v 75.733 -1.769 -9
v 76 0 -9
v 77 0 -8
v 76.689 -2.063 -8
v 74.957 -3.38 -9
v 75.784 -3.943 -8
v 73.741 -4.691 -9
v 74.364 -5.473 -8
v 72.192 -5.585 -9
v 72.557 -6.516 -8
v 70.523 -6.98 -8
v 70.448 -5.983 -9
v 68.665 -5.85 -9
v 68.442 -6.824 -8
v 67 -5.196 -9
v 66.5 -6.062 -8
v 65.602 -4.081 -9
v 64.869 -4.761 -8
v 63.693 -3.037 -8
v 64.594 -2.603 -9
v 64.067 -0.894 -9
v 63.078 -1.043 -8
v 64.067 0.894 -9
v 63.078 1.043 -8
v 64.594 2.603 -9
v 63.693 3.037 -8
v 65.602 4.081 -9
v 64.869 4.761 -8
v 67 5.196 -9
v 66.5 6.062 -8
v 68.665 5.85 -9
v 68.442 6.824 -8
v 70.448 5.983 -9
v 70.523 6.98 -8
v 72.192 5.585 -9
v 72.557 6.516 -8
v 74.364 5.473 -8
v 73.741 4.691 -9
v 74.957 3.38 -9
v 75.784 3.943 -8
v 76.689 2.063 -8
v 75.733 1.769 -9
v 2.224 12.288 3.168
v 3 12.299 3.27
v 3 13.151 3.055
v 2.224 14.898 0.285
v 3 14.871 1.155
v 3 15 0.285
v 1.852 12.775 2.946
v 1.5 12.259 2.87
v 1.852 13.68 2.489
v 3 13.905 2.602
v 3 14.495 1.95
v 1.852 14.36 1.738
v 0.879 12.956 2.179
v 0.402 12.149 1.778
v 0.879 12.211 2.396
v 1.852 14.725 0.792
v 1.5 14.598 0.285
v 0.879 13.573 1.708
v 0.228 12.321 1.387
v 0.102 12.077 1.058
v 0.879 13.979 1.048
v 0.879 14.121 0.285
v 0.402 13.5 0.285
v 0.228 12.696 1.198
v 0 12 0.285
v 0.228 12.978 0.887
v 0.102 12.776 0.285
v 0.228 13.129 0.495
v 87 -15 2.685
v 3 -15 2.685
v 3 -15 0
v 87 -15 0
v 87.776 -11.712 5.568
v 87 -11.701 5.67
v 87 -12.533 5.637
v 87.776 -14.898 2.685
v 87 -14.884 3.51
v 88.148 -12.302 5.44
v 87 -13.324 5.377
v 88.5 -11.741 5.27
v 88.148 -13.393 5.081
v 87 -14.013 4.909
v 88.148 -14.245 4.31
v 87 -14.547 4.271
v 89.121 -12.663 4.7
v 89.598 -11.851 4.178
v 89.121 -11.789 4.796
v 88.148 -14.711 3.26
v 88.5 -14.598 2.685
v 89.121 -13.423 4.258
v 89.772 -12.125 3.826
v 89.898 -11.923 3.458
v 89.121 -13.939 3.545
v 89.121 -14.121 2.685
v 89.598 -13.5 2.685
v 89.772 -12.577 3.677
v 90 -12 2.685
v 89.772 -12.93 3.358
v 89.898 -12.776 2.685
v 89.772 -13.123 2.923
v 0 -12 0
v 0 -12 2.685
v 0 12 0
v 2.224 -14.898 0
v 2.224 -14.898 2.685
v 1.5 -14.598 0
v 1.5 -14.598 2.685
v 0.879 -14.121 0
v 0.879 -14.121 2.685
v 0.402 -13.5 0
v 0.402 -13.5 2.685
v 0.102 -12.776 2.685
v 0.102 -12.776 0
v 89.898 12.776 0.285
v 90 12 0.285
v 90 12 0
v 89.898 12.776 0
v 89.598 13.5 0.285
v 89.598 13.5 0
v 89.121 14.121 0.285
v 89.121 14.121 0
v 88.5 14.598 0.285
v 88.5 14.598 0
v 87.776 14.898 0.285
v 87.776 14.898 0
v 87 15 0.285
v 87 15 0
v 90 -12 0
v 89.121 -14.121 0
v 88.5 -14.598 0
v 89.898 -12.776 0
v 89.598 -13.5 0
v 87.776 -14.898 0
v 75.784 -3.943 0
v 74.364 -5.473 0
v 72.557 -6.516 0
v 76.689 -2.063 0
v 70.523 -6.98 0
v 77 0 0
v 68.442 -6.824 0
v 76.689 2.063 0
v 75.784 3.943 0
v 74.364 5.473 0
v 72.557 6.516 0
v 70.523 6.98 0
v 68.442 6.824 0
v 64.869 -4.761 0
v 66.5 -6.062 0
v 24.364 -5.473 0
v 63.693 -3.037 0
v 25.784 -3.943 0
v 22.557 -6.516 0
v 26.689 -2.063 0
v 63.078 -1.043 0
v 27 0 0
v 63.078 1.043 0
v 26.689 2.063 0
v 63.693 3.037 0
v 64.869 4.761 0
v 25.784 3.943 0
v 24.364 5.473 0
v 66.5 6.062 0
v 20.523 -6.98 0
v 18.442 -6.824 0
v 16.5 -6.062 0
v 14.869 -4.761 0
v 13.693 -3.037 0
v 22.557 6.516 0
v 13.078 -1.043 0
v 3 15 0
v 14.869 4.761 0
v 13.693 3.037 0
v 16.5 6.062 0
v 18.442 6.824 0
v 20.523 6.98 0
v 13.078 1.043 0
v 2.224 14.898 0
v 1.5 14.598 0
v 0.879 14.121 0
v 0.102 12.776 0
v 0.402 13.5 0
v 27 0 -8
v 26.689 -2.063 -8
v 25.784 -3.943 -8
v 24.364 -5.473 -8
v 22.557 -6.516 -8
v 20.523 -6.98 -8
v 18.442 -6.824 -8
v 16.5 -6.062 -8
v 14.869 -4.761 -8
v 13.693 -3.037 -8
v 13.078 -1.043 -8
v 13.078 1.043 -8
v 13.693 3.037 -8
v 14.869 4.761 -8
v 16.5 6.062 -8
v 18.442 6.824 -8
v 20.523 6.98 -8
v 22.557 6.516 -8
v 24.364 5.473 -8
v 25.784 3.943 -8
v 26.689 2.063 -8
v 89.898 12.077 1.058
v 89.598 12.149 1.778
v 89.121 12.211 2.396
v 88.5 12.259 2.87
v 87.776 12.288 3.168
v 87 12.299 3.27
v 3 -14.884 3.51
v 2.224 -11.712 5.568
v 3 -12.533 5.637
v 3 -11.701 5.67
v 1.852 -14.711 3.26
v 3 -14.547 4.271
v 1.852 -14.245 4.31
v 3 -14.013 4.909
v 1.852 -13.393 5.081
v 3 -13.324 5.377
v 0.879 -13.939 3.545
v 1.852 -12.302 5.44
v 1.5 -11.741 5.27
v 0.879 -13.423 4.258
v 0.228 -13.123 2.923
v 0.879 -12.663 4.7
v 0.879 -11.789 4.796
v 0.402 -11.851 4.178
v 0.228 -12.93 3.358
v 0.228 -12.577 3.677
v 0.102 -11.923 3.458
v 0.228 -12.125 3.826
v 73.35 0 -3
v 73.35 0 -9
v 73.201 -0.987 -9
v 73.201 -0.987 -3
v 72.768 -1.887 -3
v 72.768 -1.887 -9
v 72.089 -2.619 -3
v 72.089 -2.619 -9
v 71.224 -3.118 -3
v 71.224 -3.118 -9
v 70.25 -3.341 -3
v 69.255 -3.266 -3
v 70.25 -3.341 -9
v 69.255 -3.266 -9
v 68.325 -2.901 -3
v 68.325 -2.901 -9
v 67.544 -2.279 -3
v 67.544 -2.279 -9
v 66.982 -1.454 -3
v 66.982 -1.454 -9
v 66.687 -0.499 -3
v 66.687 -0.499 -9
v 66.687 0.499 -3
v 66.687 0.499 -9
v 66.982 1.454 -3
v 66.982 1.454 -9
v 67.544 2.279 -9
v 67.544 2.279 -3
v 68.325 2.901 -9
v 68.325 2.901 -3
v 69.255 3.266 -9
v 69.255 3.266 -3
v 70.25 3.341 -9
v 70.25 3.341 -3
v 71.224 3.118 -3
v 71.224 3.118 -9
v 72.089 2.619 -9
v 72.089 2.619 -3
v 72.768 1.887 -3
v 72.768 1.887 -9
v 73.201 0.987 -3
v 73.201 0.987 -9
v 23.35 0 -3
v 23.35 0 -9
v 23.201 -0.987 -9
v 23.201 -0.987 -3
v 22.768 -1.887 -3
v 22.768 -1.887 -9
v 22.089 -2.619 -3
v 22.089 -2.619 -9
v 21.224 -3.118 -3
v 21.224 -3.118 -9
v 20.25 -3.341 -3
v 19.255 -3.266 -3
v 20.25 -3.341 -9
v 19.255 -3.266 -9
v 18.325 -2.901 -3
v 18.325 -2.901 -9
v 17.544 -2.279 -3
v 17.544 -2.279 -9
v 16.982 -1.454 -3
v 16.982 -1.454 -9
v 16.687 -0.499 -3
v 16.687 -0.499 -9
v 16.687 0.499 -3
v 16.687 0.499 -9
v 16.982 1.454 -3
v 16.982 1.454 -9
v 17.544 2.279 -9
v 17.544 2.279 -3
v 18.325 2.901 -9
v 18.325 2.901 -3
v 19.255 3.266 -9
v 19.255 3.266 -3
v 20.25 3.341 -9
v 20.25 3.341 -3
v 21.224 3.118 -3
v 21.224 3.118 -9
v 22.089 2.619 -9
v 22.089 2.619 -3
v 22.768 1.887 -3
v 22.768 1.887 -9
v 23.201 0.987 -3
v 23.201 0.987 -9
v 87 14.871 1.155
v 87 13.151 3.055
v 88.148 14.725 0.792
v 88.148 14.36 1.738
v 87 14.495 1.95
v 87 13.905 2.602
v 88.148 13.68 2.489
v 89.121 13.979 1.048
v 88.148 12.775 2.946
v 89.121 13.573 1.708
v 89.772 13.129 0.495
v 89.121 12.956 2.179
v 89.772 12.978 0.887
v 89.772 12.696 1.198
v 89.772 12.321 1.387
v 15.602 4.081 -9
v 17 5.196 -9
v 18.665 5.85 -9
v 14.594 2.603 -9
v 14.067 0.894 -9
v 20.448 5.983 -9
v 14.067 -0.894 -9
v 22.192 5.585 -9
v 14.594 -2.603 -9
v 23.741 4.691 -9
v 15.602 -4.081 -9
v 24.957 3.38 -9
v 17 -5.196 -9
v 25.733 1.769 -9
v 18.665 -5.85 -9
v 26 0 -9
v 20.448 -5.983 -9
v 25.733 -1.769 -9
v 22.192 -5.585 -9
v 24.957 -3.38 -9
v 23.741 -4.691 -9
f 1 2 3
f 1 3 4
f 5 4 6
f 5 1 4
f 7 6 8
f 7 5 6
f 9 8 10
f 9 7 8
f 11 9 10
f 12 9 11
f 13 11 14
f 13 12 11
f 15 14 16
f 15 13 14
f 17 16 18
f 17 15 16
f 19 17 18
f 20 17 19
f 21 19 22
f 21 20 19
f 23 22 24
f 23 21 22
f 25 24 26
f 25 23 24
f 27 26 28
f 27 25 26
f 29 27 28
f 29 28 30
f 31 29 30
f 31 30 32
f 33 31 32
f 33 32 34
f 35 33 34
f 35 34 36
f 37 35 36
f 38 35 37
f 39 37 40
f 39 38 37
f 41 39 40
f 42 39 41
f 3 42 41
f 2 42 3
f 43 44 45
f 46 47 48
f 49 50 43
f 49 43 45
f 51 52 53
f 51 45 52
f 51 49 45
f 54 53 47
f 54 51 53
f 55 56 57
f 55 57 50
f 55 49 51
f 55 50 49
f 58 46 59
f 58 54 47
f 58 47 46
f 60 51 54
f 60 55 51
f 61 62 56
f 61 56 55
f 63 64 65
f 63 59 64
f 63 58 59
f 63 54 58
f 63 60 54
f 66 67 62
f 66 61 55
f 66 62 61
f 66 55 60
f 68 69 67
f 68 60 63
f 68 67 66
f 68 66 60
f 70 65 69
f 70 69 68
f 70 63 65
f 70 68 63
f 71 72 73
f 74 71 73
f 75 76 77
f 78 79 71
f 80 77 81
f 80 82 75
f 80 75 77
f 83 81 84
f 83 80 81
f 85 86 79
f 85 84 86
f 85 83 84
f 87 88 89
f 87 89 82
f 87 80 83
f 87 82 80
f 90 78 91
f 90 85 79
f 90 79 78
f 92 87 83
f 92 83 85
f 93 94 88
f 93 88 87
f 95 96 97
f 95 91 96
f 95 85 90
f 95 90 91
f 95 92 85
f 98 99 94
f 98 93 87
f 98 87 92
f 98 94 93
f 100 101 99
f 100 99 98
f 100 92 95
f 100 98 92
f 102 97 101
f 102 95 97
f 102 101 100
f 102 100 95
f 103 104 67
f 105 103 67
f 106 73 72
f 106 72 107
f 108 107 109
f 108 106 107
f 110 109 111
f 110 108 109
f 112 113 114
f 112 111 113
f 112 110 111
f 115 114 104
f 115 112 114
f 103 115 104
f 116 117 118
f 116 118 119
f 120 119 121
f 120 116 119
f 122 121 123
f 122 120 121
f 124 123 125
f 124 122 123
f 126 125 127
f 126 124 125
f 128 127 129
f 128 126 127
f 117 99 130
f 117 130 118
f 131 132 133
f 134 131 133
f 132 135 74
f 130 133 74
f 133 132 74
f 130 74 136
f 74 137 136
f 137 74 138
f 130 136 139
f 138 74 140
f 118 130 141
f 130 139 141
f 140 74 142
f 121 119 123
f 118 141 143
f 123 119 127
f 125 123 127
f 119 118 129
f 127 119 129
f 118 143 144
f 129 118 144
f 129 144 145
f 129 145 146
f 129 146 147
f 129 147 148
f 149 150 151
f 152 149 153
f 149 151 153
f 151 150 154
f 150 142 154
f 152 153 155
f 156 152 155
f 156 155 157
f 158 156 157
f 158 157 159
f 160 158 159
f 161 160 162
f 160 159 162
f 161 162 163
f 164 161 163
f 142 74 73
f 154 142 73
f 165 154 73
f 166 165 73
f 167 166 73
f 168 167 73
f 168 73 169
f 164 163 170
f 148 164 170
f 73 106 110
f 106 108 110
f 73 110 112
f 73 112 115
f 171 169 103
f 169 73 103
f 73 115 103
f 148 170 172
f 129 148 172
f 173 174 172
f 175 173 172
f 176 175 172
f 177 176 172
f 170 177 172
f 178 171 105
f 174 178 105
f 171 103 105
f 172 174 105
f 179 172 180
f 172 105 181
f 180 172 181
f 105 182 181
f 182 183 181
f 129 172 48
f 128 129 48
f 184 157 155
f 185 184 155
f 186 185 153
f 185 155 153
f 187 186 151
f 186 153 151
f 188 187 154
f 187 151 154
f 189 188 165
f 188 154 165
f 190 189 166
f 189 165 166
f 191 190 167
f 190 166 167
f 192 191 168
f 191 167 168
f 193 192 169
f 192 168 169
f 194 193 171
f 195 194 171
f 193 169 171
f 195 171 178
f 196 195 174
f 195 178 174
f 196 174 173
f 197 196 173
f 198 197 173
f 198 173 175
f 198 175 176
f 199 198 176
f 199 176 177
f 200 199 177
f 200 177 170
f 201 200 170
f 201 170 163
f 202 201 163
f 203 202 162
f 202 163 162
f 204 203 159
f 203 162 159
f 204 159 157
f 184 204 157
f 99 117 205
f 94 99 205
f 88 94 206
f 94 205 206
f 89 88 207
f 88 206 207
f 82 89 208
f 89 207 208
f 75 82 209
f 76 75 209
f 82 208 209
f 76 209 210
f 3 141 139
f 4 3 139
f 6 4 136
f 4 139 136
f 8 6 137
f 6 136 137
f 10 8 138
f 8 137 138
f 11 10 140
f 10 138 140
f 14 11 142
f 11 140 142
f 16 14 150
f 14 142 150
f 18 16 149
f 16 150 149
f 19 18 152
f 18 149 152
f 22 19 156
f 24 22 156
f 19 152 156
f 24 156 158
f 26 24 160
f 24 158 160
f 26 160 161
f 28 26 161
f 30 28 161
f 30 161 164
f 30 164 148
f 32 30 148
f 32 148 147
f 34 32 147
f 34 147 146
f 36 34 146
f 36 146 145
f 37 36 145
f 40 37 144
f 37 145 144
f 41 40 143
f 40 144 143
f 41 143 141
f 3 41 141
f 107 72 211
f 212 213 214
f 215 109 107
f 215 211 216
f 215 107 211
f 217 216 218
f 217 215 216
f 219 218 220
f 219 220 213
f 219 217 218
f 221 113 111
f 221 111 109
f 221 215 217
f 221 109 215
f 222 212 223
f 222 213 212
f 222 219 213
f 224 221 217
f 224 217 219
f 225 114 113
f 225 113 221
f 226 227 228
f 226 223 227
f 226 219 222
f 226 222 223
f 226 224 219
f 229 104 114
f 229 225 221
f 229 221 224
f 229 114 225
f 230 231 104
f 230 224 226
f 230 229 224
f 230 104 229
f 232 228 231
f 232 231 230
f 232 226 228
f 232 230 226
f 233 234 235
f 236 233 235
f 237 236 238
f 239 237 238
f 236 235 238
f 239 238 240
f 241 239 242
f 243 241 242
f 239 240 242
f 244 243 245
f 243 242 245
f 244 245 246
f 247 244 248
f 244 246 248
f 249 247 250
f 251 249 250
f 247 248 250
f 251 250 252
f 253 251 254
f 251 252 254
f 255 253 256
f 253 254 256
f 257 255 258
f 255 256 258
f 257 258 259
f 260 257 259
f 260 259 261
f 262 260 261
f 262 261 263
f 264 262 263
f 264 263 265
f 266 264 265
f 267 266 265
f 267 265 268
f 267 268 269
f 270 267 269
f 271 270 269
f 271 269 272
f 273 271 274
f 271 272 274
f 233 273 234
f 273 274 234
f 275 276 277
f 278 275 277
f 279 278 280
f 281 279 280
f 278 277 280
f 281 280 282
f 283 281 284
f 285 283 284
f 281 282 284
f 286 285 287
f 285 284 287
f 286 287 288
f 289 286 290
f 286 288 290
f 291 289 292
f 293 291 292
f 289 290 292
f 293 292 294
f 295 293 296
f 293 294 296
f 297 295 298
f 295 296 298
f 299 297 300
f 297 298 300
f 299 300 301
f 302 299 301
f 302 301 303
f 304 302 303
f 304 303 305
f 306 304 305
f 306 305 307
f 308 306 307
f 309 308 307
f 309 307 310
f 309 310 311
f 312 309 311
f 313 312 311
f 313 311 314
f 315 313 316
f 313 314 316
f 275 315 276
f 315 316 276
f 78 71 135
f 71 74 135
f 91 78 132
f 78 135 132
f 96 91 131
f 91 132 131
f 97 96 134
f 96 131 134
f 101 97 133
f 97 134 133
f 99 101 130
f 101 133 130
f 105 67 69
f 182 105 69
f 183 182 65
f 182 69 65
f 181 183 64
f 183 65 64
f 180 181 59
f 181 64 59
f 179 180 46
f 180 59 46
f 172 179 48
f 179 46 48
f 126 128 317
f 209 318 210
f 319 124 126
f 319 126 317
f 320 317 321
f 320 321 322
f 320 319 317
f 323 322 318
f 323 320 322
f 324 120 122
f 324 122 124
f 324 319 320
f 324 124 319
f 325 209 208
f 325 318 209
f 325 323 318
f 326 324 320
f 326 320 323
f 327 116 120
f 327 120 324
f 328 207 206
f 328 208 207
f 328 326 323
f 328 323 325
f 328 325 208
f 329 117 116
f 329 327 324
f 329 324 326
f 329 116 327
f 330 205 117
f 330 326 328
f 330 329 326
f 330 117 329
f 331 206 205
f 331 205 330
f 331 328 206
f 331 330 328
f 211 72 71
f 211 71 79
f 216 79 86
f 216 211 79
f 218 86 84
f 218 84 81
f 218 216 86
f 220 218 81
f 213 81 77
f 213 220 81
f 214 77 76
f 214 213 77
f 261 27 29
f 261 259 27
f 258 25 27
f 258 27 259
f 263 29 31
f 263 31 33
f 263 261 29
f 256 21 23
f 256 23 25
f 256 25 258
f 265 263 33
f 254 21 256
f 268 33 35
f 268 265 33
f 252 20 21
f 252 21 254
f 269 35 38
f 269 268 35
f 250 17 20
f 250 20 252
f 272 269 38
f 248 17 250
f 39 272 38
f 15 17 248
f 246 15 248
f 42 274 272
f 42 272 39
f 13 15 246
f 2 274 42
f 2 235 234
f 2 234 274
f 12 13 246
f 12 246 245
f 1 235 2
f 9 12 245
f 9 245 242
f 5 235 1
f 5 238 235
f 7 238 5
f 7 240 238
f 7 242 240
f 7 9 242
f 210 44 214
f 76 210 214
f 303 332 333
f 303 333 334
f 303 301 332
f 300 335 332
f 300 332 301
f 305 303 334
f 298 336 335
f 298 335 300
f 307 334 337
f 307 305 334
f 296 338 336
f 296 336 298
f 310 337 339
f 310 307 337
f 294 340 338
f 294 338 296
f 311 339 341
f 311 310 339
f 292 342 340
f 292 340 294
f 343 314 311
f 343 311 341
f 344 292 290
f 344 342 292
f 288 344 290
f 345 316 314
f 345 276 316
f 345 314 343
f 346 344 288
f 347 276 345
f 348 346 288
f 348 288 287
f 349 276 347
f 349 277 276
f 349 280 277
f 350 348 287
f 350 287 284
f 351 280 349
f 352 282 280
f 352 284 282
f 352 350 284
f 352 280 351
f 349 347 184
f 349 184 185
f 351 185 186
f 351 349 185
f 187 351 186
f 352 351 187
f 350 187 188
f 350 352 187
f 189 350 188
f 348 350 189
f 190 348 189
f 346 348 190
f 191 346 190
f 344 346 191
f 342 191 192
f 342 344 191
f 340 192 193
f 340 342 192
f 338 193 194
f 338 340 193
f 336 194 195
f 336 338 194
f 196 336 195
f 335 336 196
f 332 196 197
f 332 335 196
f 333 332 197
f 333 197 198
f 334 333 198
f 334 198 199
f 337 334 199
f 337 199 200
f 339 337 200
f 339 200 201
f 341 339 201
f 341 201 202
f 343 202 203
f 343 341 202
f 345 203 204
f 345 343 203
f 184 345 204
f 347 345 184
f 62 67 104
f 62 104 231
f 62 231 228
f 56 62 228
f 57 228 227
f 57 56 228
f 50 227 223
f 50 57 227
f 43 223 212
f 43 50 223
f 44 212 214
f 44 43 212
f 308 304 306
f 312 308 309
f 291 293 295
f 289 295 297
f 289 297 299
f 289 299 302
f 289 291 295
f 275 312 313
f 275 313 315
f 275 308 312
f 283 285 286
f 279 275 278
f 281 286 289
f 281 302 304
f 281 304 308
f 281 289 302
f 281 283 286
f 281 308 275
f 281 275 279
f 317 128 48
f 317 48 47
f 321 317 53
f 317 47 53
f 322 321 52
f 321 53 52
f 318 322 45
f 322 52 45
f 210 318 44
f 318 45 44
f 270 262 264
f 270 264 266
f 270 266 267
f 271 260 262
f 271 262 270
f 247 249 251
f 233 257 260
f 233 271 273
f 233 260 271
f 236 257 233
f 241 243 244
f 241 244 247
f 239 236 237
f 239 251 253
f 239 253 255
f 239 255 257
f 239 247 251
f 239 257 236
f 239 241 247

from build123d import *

# Parameters (mm, degrees)
F1_DEPTH     = 90
F3_R         = 7
F4_DEPTH     = 9
F5_R         = 3.35
F6_DEPTH     = 6
F7_SIZE      = 1
F8_R         = 3
F9_T1_DEPTH  = 84
F9_T3_DEPTH  = 24.1197014907
F9_T8_DEPTH  = 3
F9_T14_DEPTH = 3
F9_T20_DEPTH = 3
F9_T26_DEPTH = 3


# Not quite as in the source:
# - a fillet or chamfer that OpenCascade refuses, or shapes differently, is made with other operations: its cross-section is extruded or revolved along the edge and cut away or added


with BuildPart() as f1:
    # F0 (on Right) → F1 (new body)
    with BuildSketch(Plane.YZ):
        Polygon((-15, 6), (-15, 0), (15, 0), (15, 3), align=None)
    extrude(amount=F1_DEPTH)

    # F3 (on face) → F4 (join)
    with BuildSketch(Plane(origin=(0, 0, 0), x_dir=(1, 0, 0), z_dir=(0, 0, -1))):
        with Locations((70, 0)):
            Circle(F3_R)
        with Locations((20, 0)):
            Circle(F3_R)
    extrude(amount=F4_DEPTH)

    # F5 (on face) → F6 (cut)
    with BuildSketch(Plane(origin=(0, 0, -9), x_dir=(1, 0, 0), z_dir=(0, 0, -1))):
        with Locations((70, 0)):
            Circle(F5_R)
        with Locations((20, 0)):
            Circle(F5_R)
    extrude(amount=-F6_DEPTH, mode=Mode.SUBTRACT)

    # F7
    f7_edges = [f1.edges().sort_by_distance(p)[0] for p in [
        (63, 0, -9),
        (13, 0, -9),
    ]]
    chamfer(f7_edges, length=F7_SIZE)

    # F8
    f8_edges = [f1.edges().sort_by_distance(p)[0] for p in [
        (90, 15, 1.5),
        (0, 15, 1.5),
        (0, -15, 3),
        (90, -15, 3),
    ]]
    fillet(f8_edges, radius=F8_R)

    # F9: fillet of radius 3 on 4 edges, made by hand

    # F9_s2 → F9_t1 (cut)
    with BuildSketch(Plane.YZ.offset(3)):
        with BuildLine():
            ThreePointArc((15, 0.2850373137), (14.2243576007, 2.2980532759), (12.2985111571, 3.2701488843))
            Line((12.2985111571, 3.2701488843), (15, 3))
            Line((15, 3), (15, 0.2850373137))
        make_face()
        with BuildLine():
            ThreePointArc((-15, 2.6850373137), (-14.0130159623, 4.9093949143), (-11.7014888429, 5.6701488843))
            Line((-11.7014888429, 5.6701488843), (-15, 6))
            Line((-15, 6), (-15, 2.6850373137))
        make_face()
    extrude(amount=F9_T1_DEPTH, mode=Mode.SUBTRACT)

    # F9_s4 → F9_t3 (cut)
    with BuildSketch(Plane(origin=(0, 11.8529666026, -1.1852966603), x_dir=(1, 0, 0), z_dir=(0, -0.9950371902, 0.099503719))):
        with BuildLine():
            ThreePointArc((0, 1.4776673559), (0.8786796564, 3.5989876995), (3, 4.4776673559))
            Line((3, 4.4776673559), (0, 4.4776673559))
            Line((0, 4.4776673559), (0, 1.4776673559))
        make_face()
        with BuildLine():
            ThreePointArc((90, 1.4776673559), (89.1213203436, 3.5989876995), (87, 4.4776673559))
            Line((87, 4.4776673559), (90, 4.4776673559))
            Line((90, 4.4776673559), (90, 1.4776673559))
        make_face()
    extrude(amount=F9_T3_DEPTH, mode=Mode.SUBTRACT)


with BuildPart() as f9_tool6:
    # F9_s7 → F9_t8 (new body)
    with BuildSketch(Plane.YZ.offset(87)):
        Polygon((12, 0.2850373137), (15, 0.2850373137), (15, 3), (12.2985111571, 3.2701488843), align=None)
    extrude(amount=F9_T8_DEPTH)

    # F9_s9 → F9_t10 (revolve, cut)
    with BuildSketch(Plane(origin=(87, 12, 0.2850373137), x_dir=(0, -0.7414525336, -0.6710053208), z_dir=(0, -0.6710053208, 0.7414525336))):
        with BuildLine():
            ThreePointArc((0, -3), (3, 0), (0, 3))
            Line((0, 3), (0, -3))
        make_face()
    revolve(axis=Axis((87, 12, 0.2850373137), (1, 0, 0)), mode=Mode.SUBTRACT)


with BuildPart() as f1_1:
    add(f1.part)

    # F9_t5: cut F9_tool6
    add(f9_tool6.part, mode=Mode.SUBTRACT)


with BuildPart() as f9_tool12:
    # F9_s13 → F9_t14 (new body)
    with BuildSketch(Plane.YZ.offset(87)):
        Polygon((-12, 2.6850373137), (-15, 2.6850373137), (-15, 6), (-11.7014888429, 5.6701488843), align=None)
    extrude(amount=F9_T14_DEPTH)

    # F9_s15 → F9_t16 (revolve, cut)
    with BuildSketch(Plane(origin=(87, -12, 2.6850373137), x_dir=(0, 0.6710053208, -0.7414525336), z_dir=(0, -0.7414525336, -0.6710053208))):
        with BuildLine():
            ThreePointArc((0, -3), (3, 0), (0, 3))
            Line((0, 3), (0, -3))
        make_face()
    revolve(axis=Axis((87, -12, 2.6850373137), (1, 0, 0)), mode=Mode.SUBTRACT)


with BuildPart() as f1_2:
    add(f1_1.part)

    # F9_t11: cut F9_tool12
    add(f9_tool12.part, mode=Mode.SUBTRACT)


with BuildPart() as f9_tool18:
    # F9_s19 → F9_t20 (new body)
    with BuildSketch(Plane.YZ.offset(3)):
        Polygon((12, 0.2850373137), (15, 0.2850373137), (15, 3), (12.2985111571, 3.2701488843), align=None)
    extrude(amount=-F9_T20_DEPTH)

    # F9_s21 → F9_t22 (revolve, cut)
    with BuildSketch(Plane(origin=(3, 12, 0.2850373137), x_dir=(0, -0.7414525336, -0.6710053208), z_dir=(0, 0.6710053208, -0.7414525336))):
        with BuildLine():
            ThreePointArc((0, -3), (3, 0), (0, 3))
            Line((0, 3), (0, -3))
        make_face()
    revolve(axis=Axis((3, 12, 0.2850373137), (-1, 0, 0)), mode=Mode.SUBTRACT)


with BuildPart() as f1_3:
    add(f1_2.part)

    # F9_t17: cut F9_tool18
    add(f9_tool18.part, mode=Mode.SUBTRACT)


with BuildPart() as f9_tool24:
    # F9_s25 → F9_t26 (new body)
    with BuildSketch(Plane.YZ.offset(3)):
        Polygon((-12, 2.6850373137), (-15, 2.6850373137), (-15, 6), (-11.7014888429, 5.6701488843), align=None)
    extrude(amount=-F9_T26_DEPTH)

    # F9_s27 → F9_t28 (revolve, cut)
    with BuildSketch(Plane(origin=(3, -12, 2.6850373137), x_dir=(0, 0.6710053208, -0.7414525336), z_dir=(0, 0.7414525336, 0.6710053208))):
        with BuildLine():
            ThreePointArc((0, -3), (3, 0), (0, 3))
            Line((0, 3), (0, -3))
        make_face()
    revolve(axis=Axis((3, -12, 2.6850373137), (-1, 0, 0)), mode=Mode.SUBTRACT)


with BuildPart() as f1_4:
    add(f1_3.part)

    # F9_t23: cut F9_tool24
    add(f9_tool24.part, mode=Mode.SUBTRACT)


solid = f1_4.part
